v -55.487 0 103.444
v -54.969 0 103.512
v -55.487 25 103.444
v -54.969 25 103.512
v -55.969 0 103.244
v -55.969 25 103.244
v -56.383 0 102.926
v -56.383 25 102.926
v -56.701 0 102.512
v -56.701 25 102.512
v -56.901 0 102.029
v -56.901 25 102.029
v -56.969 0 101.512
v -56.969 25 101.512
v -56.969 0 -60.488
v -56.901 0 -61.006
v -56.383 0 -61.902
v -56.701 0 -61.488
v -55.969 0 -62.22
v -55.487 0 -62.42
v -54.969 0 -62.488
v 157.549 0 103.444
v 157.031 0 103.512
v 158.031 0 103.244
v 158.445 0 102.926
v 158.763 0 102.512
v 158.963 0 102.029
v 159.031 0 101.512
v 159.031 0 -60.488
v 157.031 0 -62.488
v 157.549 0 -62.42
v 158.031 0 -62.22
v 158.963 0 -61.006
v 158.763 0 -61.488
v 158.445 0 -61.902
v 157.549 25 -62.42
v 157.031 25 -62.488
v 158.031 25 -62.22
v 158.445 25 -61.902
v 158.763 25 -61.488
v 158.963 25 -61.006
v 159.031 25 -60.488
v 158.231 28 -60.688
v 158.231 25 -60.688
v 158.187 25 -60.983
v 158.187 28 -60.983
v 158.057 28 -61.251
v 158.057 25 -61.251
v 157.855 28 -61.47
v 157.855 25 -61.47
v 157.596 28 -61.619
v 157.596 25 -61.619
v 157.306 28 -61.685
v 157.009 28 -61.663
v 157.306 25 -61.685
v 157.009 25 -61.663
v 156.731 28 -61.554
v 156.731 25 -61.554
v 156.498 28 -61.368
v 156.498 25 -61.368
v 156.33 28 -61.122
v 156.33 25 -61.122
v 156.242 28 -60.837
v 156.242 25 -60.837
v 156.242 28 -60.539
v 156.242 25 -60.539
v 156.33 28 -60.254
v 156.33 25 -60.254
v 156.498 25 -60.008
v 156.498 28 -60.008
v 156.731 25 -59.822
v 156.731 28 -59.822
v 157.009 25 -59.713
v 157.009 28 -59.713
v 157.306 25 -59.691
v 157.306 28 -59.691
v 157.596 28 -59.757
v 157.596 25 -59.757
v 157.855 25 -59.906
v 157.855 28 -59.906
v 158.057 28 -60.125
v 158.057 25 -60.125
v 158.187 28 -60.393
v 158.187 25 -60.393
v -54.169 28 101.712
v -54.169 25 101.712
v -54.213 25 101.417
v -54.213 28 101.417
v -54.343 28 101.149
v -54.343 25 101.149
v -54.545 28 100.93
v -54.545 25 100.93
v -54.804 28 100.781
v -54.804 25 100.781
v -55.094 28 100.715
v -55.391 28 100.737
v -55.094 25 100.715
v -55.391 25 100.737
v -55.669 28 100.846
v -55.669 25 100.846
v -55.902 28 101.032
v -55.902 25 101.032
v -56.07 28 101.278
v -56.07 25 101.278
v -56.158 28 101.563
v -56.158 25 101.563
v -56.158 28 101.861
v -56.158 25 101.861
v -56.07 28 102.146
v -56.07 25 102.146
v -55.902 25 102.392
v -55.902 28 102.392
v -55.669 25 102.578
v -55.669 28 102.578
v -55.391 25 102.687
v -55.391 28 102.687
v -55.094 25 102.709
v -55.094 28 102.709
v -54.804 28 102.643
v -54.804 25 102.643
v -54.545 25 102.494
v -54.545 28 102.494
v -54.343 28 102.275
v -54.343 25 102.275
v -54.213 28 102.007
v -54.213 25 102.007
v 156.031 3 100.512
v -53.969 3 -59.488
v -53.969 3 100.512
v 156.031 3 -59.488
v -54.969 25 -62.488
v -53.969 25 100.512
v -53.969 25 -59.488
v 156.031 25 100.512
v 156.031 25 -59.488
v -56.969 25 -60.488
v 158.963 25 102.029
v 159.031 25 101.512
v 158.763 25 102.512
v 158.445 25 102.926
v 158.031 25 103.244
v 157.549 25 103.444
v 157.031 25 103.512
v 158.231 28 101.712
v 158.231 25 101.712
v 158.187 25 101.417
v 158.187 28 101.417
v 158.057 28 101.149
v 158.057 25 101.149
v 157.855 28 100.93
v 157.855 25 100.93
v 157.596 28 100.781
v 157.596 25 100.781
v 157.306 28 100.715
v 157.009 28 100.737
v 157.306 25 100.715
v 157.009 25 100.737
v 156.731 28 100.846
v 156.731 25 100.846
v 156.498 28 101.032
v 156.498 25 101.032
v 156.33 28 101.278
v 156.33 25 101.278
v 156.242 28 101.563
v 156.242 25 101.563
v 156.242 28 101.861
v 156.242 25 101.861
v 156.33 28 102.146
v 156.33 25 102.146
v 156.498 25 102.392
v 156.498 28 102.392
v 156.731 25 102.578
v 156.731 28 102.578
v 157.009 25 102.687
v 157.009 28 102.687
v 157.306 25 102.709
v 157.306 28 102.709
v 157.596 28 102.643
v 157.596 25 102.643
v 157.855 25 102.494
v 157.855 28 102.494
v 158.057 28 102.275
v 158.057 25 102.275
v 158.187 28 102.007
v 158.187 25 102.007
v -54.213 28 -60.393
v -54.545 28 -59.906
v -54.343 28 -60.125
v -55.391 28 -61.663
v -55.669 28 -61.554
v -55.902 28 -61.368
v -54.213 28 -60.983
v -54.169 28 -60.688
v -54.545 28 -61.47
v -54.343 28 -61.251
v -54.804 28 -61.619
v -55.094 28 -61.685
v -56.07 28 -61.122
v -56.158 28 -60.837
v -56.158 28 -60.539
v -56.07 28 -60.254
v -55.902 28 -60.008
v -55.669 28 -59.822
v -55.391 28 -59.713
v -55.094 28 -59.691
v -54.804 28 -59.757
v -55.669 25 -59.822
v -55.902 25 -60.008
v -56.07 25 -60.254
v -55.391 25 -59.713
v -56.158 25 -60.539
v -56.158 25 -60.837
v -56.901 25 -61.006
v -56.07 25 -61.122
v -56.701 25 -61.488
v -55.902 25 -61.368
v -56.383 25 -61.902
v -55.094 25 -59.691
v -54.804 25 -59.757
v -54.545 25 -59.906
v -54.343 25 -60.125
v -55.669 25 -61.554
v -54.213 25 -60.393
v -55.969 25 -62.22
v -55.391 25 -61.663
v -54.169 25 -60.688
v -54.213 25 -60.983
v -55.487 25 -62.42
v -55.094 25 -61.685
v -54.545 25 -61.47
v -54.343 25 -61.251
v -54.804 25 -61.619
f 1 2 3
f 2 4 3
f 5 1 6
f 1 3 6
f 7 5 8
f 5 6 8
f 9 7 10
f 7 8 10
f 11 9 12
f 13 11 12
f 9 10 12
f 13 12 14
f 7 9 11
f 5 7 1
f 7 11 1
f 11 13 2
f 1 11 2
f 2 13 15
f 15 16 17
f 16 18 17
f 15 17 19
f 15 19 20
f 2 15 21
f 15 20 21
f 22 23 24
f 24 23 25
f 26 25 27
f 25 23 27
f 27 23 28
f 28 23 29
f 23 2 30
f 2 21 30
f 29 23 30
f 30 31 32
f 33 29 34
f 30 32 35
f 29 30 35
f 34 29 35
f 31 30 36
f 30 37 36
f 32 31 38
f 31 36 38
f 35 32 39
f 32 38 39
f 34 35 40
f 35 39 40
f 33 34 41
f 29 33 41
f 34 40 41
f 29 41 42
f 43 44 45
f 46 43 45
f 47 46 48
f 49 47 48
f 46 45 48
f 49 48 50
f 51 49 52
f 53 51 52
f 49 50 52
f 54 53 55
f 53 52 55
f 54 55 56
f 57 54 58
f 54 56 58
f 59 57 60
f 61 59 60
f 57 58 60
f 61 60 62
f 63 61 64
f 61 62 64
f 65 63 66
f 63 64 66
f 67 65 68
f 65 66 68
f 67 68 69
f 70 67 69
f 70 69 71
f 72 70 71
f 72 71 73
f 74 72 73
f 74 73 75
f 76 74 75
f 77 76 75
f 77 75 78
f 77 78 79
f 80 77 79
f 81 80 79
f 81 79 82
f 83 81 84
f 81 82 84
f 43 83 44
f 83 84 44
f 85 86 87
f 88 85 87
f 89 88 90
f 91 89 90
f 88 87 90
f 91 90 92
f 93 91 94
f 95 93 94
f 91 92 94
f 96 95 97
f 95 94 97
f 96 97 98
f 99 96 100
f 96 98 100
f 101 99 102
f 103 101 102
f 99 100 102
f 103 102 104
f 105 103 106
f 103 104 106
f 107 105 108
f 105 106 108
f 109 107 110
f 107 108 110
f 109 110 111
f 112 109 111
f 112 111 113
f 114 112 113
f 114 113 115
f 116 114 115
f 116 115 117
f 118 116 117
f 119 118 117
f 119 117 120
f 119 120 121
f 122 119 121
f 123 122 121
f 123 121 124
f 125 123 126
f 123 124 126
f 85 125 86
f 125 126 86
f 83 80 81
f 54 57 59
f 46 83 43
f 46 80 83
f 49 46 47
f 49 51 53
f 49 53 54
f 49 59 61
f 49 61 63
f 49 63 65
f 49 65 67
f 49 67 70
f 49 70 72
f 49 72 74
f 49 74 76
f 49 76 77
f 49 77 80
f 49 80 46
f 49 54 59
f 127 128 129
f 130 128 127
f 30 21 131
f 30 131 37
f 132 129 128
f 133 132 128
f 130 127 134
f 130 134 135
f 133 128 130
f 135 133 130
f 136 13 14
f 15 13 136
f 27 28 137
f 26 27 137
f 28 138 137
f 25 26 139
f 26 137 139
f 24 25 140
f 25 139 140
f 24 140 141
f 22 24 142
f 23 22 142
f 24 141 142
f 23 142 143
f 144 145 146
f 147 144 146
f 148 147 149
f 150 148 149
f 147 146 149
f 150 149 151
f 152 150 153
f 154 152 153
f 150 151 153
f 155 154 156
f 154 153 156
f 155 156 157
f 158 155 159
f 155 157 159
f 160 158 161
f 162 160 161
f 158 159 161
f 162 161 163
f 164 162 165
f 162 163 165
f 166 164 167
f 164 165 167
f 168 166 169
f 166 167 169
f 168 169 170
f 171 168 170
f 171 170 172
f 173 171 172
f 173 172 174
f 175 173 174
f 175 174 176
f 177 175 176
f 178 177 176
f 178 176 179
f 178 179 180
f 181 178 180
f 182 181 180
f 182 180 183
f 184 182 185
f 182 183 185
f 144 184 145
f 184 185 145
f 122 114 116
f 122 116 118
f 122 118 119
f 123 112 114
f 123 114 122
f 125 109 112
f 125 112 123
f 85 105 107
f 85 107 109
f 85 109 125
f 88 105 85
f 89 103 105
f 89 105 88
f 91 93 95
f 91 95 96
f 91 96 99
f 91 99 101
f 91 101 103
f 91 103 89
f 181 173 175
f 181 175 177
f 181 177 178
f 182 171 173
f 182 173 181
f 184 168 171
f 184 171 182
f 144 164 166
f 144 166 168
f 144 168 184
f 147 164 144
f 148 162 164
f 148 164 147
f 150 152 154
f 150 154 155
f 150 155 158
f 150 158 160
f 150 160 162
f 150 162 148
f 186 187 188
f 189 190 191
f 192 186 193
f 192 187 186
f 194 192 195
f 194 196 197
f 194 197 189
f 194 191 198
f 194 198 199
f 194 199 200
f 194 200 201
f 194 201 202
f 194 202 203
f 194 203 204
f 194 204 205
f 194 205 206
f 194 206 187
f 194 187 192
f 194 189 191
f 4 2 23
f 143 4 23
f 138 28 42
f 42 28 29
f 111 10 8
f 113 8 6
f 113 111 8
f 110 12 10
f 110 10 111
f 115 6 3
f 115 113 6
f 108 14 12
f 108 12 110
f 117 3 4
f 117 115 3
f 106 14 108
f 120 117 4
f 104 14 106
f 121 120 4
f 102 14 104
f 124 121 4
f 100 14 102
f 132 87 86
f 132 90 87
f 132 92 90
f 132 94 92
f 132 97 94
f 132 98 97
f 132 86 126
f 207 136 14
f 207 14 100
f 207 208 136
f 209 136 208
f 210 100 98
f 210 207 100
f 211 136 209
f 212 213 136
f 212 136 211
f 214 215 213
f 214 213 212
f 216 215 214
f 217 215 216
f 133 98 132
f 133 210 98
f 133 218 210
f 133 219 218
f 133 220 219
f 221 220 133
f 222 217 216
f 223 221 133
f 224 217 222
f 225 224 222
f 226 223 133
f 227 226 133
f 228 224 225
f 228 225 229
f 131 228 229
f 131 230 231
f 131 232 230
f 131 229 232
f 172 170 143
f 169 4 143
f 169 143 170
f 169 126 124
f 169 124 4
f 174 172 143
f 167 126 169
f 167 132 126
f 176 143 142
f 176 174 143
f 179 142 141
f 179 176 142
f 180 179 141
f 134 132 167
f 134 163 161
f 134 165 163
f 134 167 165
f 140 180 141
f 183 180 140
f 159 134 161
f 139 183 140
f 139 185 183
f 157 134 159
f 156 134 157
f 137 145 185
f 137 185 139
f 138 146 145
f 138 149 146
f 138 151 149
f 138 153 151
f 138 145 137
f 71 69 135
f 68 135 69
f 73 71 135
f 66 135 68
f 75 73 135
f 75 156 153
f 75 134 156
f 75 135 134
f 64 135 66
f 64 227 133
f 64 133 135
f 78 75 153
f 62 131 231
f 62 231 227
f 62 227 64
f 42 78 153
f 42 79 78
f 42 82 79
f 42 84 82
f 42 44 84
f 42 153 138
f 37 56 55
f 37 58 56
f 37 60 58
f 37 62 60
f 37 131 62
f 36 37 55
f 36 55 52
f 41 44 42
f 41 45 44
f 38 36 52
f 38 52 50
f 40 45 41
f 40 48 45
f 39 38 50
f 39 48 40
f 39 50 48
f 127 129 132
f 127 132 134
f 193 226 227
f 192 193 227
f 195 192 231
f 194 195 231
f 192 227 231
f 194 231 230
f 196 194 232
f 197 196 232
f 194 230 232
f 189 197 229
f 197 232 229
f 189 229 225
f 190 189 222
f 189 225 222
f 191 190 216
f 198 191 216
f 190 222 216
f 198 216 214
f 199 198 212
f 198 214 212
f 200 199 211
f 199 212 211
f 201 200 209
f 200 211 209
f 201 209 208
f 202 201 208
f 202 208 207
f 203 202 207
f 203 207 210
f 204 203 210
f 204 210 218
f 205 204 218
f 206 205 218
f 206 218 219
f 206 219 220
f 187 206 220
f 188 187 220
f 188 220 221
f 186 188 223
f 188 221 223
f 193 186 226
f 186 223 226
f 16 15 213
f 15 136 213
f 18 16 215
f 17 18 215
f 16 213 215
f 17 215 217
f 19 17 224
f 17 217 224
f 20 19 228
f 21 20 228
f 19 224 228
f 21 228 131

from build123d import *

# Parameters (mm, degrees)
ESQUISSE2_W         = 216
ESQUISSE2_H         = 166
ESQUISSE2_W_2       = 210
ESQUISSE2_H_2       = 160
BOSS_EXTRU_1_DEPTH  = 25
ESQUISSE4_W         = 210
ESQUISSE4_H         = 160
BOSS_EXTRU_3_DEPTH  = 3
CONG_2_R            = 2
CONG_3_R            = 2
CONG_4_R            = 2
CONG_5_R            = 2
ESQUISSE19_R        = 1
BOSS_EXTRU_8_DEPTH  = 3
ESQUISSE18_R        = 1
BOSS_EXTRU_9_DEPTH  = 3
ESQUISSE17_R        = 1
BOSS_EXTRU_10_DEPTH = 3
ESQUISSE14_R        = 1
BOSS_EXTRU_11_DEPTH = 3


with BuildPart() as part:
    # Esquisse2 → Boss.-Extru.1 (new body)
    with BuildSketch(Plane(origin=(0, 0, 0), x_dir=(1, 0, 0), z_dir=(0, 1, 0))):
        with Locations((51.031114613, -20.511820558)):
            Rectangle(ESQUISSE2_W, ESQUISSE2_H)
        with Locations((51.031114613, -20.511820558)):
            Rectangle(ESQUISSE2_W_2, ESQUISSE2_H_2, mode=Mode.SUBTRACT)
    extrude(amount=BOSS_EXTRU_1_DEPTH)

    # Esquisse4 → Boss.-Extru.3 (add)
    with BuildSketch(Plane(origin=(0, 0, 0), x_dir=(1, 0, 0), z_dir=(0, 1, 0))):
        with Locations((51.031114613, -20.511820558)):
            Rectangle(ESQUISSE4_W, ESQUISSE4_H)
    extrude(amount=BOSS_EXTRU_3_DEPTH)

    # Congé2
    cong_2_edges = [part.edges().sort_by_distance(p)[0] for p in [
        (159.031114613, 12.5, -62.488179442),
    ]]
    fillet(cong_2_edges, radius=CONG_2_R)

    # Congé3
    cong_3_edges = [part.edges().sort_by_distance(p)[0] for p in [
        (159.031114613, 12.5, 103.511820558),
    ]]
    fillet(cong_3_edges, radius=CONG_3_R)

    # Congé4
    cong_4_edges = [part.edges().sort_by_distance(p)[0] for p in [
        (-56.968885387, 12.5, 103.511820558),
    ]]
    fillet(cong_4_edges, radius=CONG_4_R)

    # Congé5
    cong_5_edges = [part.edges().sort_by_distance(p)[0] for p in [
        (-56.968885387, 12.5, -62.488179442),
    ]]
    fillet(cong_5_edges, radius=CONG_5_R)

    # Esquisse19 → Boss.-Extru.8 (add)
    with BuildSketch(Plane(origin=(0, 25, 0), x_dir=(1, 0, 0), z_dir=(0, 1, 0))):
        with Locations((-55.168885387, 60.688179442)):
            Circle(ESQUISSE19_R)
    extrude(amount=BOSS_EXTRU_8_DEPTH)

    # Esquisse18 → Boss.-Extru.9 (add)
    with BuildSketch(Plane(origin=(0, 25, 0), x_dir=(1, 0, 0), z_dir=(0, 1, 0))):
        with Locations((-55.168885387, -101.711820558)):
            Circle(ESQUISSE18_R)
    extrude(amount=BOSS_EXTRU_9_DEPTH)

    # Esquisse17 → Boss.-Extru.10 (add)
    with BuildSketch(Plane(origin=(0, 25, 0), x_dir=(1, 0, 0), z_dir=(0, 1, 0))):
        with Locations((157.231114613, -101.711820558)):
            Circle(ESQUISSE17_R)
    extrude(amount=BOSS_EXTRU_10_DEPTH)

    # Esquisse14 → Boss.-Extru.11 (add)
    with BuildSketch(Plane(origin=(0, 25, 0), x_dir=(1, 0, 0), z_dir=(0, 1, 0))):
        with Locations((157.231114613, 60.688179442)):
            Circle(ESQUISSE14_R)
    extrude(amount=BOSS_EXTRU_11_DEPTH)


solid = part.part
